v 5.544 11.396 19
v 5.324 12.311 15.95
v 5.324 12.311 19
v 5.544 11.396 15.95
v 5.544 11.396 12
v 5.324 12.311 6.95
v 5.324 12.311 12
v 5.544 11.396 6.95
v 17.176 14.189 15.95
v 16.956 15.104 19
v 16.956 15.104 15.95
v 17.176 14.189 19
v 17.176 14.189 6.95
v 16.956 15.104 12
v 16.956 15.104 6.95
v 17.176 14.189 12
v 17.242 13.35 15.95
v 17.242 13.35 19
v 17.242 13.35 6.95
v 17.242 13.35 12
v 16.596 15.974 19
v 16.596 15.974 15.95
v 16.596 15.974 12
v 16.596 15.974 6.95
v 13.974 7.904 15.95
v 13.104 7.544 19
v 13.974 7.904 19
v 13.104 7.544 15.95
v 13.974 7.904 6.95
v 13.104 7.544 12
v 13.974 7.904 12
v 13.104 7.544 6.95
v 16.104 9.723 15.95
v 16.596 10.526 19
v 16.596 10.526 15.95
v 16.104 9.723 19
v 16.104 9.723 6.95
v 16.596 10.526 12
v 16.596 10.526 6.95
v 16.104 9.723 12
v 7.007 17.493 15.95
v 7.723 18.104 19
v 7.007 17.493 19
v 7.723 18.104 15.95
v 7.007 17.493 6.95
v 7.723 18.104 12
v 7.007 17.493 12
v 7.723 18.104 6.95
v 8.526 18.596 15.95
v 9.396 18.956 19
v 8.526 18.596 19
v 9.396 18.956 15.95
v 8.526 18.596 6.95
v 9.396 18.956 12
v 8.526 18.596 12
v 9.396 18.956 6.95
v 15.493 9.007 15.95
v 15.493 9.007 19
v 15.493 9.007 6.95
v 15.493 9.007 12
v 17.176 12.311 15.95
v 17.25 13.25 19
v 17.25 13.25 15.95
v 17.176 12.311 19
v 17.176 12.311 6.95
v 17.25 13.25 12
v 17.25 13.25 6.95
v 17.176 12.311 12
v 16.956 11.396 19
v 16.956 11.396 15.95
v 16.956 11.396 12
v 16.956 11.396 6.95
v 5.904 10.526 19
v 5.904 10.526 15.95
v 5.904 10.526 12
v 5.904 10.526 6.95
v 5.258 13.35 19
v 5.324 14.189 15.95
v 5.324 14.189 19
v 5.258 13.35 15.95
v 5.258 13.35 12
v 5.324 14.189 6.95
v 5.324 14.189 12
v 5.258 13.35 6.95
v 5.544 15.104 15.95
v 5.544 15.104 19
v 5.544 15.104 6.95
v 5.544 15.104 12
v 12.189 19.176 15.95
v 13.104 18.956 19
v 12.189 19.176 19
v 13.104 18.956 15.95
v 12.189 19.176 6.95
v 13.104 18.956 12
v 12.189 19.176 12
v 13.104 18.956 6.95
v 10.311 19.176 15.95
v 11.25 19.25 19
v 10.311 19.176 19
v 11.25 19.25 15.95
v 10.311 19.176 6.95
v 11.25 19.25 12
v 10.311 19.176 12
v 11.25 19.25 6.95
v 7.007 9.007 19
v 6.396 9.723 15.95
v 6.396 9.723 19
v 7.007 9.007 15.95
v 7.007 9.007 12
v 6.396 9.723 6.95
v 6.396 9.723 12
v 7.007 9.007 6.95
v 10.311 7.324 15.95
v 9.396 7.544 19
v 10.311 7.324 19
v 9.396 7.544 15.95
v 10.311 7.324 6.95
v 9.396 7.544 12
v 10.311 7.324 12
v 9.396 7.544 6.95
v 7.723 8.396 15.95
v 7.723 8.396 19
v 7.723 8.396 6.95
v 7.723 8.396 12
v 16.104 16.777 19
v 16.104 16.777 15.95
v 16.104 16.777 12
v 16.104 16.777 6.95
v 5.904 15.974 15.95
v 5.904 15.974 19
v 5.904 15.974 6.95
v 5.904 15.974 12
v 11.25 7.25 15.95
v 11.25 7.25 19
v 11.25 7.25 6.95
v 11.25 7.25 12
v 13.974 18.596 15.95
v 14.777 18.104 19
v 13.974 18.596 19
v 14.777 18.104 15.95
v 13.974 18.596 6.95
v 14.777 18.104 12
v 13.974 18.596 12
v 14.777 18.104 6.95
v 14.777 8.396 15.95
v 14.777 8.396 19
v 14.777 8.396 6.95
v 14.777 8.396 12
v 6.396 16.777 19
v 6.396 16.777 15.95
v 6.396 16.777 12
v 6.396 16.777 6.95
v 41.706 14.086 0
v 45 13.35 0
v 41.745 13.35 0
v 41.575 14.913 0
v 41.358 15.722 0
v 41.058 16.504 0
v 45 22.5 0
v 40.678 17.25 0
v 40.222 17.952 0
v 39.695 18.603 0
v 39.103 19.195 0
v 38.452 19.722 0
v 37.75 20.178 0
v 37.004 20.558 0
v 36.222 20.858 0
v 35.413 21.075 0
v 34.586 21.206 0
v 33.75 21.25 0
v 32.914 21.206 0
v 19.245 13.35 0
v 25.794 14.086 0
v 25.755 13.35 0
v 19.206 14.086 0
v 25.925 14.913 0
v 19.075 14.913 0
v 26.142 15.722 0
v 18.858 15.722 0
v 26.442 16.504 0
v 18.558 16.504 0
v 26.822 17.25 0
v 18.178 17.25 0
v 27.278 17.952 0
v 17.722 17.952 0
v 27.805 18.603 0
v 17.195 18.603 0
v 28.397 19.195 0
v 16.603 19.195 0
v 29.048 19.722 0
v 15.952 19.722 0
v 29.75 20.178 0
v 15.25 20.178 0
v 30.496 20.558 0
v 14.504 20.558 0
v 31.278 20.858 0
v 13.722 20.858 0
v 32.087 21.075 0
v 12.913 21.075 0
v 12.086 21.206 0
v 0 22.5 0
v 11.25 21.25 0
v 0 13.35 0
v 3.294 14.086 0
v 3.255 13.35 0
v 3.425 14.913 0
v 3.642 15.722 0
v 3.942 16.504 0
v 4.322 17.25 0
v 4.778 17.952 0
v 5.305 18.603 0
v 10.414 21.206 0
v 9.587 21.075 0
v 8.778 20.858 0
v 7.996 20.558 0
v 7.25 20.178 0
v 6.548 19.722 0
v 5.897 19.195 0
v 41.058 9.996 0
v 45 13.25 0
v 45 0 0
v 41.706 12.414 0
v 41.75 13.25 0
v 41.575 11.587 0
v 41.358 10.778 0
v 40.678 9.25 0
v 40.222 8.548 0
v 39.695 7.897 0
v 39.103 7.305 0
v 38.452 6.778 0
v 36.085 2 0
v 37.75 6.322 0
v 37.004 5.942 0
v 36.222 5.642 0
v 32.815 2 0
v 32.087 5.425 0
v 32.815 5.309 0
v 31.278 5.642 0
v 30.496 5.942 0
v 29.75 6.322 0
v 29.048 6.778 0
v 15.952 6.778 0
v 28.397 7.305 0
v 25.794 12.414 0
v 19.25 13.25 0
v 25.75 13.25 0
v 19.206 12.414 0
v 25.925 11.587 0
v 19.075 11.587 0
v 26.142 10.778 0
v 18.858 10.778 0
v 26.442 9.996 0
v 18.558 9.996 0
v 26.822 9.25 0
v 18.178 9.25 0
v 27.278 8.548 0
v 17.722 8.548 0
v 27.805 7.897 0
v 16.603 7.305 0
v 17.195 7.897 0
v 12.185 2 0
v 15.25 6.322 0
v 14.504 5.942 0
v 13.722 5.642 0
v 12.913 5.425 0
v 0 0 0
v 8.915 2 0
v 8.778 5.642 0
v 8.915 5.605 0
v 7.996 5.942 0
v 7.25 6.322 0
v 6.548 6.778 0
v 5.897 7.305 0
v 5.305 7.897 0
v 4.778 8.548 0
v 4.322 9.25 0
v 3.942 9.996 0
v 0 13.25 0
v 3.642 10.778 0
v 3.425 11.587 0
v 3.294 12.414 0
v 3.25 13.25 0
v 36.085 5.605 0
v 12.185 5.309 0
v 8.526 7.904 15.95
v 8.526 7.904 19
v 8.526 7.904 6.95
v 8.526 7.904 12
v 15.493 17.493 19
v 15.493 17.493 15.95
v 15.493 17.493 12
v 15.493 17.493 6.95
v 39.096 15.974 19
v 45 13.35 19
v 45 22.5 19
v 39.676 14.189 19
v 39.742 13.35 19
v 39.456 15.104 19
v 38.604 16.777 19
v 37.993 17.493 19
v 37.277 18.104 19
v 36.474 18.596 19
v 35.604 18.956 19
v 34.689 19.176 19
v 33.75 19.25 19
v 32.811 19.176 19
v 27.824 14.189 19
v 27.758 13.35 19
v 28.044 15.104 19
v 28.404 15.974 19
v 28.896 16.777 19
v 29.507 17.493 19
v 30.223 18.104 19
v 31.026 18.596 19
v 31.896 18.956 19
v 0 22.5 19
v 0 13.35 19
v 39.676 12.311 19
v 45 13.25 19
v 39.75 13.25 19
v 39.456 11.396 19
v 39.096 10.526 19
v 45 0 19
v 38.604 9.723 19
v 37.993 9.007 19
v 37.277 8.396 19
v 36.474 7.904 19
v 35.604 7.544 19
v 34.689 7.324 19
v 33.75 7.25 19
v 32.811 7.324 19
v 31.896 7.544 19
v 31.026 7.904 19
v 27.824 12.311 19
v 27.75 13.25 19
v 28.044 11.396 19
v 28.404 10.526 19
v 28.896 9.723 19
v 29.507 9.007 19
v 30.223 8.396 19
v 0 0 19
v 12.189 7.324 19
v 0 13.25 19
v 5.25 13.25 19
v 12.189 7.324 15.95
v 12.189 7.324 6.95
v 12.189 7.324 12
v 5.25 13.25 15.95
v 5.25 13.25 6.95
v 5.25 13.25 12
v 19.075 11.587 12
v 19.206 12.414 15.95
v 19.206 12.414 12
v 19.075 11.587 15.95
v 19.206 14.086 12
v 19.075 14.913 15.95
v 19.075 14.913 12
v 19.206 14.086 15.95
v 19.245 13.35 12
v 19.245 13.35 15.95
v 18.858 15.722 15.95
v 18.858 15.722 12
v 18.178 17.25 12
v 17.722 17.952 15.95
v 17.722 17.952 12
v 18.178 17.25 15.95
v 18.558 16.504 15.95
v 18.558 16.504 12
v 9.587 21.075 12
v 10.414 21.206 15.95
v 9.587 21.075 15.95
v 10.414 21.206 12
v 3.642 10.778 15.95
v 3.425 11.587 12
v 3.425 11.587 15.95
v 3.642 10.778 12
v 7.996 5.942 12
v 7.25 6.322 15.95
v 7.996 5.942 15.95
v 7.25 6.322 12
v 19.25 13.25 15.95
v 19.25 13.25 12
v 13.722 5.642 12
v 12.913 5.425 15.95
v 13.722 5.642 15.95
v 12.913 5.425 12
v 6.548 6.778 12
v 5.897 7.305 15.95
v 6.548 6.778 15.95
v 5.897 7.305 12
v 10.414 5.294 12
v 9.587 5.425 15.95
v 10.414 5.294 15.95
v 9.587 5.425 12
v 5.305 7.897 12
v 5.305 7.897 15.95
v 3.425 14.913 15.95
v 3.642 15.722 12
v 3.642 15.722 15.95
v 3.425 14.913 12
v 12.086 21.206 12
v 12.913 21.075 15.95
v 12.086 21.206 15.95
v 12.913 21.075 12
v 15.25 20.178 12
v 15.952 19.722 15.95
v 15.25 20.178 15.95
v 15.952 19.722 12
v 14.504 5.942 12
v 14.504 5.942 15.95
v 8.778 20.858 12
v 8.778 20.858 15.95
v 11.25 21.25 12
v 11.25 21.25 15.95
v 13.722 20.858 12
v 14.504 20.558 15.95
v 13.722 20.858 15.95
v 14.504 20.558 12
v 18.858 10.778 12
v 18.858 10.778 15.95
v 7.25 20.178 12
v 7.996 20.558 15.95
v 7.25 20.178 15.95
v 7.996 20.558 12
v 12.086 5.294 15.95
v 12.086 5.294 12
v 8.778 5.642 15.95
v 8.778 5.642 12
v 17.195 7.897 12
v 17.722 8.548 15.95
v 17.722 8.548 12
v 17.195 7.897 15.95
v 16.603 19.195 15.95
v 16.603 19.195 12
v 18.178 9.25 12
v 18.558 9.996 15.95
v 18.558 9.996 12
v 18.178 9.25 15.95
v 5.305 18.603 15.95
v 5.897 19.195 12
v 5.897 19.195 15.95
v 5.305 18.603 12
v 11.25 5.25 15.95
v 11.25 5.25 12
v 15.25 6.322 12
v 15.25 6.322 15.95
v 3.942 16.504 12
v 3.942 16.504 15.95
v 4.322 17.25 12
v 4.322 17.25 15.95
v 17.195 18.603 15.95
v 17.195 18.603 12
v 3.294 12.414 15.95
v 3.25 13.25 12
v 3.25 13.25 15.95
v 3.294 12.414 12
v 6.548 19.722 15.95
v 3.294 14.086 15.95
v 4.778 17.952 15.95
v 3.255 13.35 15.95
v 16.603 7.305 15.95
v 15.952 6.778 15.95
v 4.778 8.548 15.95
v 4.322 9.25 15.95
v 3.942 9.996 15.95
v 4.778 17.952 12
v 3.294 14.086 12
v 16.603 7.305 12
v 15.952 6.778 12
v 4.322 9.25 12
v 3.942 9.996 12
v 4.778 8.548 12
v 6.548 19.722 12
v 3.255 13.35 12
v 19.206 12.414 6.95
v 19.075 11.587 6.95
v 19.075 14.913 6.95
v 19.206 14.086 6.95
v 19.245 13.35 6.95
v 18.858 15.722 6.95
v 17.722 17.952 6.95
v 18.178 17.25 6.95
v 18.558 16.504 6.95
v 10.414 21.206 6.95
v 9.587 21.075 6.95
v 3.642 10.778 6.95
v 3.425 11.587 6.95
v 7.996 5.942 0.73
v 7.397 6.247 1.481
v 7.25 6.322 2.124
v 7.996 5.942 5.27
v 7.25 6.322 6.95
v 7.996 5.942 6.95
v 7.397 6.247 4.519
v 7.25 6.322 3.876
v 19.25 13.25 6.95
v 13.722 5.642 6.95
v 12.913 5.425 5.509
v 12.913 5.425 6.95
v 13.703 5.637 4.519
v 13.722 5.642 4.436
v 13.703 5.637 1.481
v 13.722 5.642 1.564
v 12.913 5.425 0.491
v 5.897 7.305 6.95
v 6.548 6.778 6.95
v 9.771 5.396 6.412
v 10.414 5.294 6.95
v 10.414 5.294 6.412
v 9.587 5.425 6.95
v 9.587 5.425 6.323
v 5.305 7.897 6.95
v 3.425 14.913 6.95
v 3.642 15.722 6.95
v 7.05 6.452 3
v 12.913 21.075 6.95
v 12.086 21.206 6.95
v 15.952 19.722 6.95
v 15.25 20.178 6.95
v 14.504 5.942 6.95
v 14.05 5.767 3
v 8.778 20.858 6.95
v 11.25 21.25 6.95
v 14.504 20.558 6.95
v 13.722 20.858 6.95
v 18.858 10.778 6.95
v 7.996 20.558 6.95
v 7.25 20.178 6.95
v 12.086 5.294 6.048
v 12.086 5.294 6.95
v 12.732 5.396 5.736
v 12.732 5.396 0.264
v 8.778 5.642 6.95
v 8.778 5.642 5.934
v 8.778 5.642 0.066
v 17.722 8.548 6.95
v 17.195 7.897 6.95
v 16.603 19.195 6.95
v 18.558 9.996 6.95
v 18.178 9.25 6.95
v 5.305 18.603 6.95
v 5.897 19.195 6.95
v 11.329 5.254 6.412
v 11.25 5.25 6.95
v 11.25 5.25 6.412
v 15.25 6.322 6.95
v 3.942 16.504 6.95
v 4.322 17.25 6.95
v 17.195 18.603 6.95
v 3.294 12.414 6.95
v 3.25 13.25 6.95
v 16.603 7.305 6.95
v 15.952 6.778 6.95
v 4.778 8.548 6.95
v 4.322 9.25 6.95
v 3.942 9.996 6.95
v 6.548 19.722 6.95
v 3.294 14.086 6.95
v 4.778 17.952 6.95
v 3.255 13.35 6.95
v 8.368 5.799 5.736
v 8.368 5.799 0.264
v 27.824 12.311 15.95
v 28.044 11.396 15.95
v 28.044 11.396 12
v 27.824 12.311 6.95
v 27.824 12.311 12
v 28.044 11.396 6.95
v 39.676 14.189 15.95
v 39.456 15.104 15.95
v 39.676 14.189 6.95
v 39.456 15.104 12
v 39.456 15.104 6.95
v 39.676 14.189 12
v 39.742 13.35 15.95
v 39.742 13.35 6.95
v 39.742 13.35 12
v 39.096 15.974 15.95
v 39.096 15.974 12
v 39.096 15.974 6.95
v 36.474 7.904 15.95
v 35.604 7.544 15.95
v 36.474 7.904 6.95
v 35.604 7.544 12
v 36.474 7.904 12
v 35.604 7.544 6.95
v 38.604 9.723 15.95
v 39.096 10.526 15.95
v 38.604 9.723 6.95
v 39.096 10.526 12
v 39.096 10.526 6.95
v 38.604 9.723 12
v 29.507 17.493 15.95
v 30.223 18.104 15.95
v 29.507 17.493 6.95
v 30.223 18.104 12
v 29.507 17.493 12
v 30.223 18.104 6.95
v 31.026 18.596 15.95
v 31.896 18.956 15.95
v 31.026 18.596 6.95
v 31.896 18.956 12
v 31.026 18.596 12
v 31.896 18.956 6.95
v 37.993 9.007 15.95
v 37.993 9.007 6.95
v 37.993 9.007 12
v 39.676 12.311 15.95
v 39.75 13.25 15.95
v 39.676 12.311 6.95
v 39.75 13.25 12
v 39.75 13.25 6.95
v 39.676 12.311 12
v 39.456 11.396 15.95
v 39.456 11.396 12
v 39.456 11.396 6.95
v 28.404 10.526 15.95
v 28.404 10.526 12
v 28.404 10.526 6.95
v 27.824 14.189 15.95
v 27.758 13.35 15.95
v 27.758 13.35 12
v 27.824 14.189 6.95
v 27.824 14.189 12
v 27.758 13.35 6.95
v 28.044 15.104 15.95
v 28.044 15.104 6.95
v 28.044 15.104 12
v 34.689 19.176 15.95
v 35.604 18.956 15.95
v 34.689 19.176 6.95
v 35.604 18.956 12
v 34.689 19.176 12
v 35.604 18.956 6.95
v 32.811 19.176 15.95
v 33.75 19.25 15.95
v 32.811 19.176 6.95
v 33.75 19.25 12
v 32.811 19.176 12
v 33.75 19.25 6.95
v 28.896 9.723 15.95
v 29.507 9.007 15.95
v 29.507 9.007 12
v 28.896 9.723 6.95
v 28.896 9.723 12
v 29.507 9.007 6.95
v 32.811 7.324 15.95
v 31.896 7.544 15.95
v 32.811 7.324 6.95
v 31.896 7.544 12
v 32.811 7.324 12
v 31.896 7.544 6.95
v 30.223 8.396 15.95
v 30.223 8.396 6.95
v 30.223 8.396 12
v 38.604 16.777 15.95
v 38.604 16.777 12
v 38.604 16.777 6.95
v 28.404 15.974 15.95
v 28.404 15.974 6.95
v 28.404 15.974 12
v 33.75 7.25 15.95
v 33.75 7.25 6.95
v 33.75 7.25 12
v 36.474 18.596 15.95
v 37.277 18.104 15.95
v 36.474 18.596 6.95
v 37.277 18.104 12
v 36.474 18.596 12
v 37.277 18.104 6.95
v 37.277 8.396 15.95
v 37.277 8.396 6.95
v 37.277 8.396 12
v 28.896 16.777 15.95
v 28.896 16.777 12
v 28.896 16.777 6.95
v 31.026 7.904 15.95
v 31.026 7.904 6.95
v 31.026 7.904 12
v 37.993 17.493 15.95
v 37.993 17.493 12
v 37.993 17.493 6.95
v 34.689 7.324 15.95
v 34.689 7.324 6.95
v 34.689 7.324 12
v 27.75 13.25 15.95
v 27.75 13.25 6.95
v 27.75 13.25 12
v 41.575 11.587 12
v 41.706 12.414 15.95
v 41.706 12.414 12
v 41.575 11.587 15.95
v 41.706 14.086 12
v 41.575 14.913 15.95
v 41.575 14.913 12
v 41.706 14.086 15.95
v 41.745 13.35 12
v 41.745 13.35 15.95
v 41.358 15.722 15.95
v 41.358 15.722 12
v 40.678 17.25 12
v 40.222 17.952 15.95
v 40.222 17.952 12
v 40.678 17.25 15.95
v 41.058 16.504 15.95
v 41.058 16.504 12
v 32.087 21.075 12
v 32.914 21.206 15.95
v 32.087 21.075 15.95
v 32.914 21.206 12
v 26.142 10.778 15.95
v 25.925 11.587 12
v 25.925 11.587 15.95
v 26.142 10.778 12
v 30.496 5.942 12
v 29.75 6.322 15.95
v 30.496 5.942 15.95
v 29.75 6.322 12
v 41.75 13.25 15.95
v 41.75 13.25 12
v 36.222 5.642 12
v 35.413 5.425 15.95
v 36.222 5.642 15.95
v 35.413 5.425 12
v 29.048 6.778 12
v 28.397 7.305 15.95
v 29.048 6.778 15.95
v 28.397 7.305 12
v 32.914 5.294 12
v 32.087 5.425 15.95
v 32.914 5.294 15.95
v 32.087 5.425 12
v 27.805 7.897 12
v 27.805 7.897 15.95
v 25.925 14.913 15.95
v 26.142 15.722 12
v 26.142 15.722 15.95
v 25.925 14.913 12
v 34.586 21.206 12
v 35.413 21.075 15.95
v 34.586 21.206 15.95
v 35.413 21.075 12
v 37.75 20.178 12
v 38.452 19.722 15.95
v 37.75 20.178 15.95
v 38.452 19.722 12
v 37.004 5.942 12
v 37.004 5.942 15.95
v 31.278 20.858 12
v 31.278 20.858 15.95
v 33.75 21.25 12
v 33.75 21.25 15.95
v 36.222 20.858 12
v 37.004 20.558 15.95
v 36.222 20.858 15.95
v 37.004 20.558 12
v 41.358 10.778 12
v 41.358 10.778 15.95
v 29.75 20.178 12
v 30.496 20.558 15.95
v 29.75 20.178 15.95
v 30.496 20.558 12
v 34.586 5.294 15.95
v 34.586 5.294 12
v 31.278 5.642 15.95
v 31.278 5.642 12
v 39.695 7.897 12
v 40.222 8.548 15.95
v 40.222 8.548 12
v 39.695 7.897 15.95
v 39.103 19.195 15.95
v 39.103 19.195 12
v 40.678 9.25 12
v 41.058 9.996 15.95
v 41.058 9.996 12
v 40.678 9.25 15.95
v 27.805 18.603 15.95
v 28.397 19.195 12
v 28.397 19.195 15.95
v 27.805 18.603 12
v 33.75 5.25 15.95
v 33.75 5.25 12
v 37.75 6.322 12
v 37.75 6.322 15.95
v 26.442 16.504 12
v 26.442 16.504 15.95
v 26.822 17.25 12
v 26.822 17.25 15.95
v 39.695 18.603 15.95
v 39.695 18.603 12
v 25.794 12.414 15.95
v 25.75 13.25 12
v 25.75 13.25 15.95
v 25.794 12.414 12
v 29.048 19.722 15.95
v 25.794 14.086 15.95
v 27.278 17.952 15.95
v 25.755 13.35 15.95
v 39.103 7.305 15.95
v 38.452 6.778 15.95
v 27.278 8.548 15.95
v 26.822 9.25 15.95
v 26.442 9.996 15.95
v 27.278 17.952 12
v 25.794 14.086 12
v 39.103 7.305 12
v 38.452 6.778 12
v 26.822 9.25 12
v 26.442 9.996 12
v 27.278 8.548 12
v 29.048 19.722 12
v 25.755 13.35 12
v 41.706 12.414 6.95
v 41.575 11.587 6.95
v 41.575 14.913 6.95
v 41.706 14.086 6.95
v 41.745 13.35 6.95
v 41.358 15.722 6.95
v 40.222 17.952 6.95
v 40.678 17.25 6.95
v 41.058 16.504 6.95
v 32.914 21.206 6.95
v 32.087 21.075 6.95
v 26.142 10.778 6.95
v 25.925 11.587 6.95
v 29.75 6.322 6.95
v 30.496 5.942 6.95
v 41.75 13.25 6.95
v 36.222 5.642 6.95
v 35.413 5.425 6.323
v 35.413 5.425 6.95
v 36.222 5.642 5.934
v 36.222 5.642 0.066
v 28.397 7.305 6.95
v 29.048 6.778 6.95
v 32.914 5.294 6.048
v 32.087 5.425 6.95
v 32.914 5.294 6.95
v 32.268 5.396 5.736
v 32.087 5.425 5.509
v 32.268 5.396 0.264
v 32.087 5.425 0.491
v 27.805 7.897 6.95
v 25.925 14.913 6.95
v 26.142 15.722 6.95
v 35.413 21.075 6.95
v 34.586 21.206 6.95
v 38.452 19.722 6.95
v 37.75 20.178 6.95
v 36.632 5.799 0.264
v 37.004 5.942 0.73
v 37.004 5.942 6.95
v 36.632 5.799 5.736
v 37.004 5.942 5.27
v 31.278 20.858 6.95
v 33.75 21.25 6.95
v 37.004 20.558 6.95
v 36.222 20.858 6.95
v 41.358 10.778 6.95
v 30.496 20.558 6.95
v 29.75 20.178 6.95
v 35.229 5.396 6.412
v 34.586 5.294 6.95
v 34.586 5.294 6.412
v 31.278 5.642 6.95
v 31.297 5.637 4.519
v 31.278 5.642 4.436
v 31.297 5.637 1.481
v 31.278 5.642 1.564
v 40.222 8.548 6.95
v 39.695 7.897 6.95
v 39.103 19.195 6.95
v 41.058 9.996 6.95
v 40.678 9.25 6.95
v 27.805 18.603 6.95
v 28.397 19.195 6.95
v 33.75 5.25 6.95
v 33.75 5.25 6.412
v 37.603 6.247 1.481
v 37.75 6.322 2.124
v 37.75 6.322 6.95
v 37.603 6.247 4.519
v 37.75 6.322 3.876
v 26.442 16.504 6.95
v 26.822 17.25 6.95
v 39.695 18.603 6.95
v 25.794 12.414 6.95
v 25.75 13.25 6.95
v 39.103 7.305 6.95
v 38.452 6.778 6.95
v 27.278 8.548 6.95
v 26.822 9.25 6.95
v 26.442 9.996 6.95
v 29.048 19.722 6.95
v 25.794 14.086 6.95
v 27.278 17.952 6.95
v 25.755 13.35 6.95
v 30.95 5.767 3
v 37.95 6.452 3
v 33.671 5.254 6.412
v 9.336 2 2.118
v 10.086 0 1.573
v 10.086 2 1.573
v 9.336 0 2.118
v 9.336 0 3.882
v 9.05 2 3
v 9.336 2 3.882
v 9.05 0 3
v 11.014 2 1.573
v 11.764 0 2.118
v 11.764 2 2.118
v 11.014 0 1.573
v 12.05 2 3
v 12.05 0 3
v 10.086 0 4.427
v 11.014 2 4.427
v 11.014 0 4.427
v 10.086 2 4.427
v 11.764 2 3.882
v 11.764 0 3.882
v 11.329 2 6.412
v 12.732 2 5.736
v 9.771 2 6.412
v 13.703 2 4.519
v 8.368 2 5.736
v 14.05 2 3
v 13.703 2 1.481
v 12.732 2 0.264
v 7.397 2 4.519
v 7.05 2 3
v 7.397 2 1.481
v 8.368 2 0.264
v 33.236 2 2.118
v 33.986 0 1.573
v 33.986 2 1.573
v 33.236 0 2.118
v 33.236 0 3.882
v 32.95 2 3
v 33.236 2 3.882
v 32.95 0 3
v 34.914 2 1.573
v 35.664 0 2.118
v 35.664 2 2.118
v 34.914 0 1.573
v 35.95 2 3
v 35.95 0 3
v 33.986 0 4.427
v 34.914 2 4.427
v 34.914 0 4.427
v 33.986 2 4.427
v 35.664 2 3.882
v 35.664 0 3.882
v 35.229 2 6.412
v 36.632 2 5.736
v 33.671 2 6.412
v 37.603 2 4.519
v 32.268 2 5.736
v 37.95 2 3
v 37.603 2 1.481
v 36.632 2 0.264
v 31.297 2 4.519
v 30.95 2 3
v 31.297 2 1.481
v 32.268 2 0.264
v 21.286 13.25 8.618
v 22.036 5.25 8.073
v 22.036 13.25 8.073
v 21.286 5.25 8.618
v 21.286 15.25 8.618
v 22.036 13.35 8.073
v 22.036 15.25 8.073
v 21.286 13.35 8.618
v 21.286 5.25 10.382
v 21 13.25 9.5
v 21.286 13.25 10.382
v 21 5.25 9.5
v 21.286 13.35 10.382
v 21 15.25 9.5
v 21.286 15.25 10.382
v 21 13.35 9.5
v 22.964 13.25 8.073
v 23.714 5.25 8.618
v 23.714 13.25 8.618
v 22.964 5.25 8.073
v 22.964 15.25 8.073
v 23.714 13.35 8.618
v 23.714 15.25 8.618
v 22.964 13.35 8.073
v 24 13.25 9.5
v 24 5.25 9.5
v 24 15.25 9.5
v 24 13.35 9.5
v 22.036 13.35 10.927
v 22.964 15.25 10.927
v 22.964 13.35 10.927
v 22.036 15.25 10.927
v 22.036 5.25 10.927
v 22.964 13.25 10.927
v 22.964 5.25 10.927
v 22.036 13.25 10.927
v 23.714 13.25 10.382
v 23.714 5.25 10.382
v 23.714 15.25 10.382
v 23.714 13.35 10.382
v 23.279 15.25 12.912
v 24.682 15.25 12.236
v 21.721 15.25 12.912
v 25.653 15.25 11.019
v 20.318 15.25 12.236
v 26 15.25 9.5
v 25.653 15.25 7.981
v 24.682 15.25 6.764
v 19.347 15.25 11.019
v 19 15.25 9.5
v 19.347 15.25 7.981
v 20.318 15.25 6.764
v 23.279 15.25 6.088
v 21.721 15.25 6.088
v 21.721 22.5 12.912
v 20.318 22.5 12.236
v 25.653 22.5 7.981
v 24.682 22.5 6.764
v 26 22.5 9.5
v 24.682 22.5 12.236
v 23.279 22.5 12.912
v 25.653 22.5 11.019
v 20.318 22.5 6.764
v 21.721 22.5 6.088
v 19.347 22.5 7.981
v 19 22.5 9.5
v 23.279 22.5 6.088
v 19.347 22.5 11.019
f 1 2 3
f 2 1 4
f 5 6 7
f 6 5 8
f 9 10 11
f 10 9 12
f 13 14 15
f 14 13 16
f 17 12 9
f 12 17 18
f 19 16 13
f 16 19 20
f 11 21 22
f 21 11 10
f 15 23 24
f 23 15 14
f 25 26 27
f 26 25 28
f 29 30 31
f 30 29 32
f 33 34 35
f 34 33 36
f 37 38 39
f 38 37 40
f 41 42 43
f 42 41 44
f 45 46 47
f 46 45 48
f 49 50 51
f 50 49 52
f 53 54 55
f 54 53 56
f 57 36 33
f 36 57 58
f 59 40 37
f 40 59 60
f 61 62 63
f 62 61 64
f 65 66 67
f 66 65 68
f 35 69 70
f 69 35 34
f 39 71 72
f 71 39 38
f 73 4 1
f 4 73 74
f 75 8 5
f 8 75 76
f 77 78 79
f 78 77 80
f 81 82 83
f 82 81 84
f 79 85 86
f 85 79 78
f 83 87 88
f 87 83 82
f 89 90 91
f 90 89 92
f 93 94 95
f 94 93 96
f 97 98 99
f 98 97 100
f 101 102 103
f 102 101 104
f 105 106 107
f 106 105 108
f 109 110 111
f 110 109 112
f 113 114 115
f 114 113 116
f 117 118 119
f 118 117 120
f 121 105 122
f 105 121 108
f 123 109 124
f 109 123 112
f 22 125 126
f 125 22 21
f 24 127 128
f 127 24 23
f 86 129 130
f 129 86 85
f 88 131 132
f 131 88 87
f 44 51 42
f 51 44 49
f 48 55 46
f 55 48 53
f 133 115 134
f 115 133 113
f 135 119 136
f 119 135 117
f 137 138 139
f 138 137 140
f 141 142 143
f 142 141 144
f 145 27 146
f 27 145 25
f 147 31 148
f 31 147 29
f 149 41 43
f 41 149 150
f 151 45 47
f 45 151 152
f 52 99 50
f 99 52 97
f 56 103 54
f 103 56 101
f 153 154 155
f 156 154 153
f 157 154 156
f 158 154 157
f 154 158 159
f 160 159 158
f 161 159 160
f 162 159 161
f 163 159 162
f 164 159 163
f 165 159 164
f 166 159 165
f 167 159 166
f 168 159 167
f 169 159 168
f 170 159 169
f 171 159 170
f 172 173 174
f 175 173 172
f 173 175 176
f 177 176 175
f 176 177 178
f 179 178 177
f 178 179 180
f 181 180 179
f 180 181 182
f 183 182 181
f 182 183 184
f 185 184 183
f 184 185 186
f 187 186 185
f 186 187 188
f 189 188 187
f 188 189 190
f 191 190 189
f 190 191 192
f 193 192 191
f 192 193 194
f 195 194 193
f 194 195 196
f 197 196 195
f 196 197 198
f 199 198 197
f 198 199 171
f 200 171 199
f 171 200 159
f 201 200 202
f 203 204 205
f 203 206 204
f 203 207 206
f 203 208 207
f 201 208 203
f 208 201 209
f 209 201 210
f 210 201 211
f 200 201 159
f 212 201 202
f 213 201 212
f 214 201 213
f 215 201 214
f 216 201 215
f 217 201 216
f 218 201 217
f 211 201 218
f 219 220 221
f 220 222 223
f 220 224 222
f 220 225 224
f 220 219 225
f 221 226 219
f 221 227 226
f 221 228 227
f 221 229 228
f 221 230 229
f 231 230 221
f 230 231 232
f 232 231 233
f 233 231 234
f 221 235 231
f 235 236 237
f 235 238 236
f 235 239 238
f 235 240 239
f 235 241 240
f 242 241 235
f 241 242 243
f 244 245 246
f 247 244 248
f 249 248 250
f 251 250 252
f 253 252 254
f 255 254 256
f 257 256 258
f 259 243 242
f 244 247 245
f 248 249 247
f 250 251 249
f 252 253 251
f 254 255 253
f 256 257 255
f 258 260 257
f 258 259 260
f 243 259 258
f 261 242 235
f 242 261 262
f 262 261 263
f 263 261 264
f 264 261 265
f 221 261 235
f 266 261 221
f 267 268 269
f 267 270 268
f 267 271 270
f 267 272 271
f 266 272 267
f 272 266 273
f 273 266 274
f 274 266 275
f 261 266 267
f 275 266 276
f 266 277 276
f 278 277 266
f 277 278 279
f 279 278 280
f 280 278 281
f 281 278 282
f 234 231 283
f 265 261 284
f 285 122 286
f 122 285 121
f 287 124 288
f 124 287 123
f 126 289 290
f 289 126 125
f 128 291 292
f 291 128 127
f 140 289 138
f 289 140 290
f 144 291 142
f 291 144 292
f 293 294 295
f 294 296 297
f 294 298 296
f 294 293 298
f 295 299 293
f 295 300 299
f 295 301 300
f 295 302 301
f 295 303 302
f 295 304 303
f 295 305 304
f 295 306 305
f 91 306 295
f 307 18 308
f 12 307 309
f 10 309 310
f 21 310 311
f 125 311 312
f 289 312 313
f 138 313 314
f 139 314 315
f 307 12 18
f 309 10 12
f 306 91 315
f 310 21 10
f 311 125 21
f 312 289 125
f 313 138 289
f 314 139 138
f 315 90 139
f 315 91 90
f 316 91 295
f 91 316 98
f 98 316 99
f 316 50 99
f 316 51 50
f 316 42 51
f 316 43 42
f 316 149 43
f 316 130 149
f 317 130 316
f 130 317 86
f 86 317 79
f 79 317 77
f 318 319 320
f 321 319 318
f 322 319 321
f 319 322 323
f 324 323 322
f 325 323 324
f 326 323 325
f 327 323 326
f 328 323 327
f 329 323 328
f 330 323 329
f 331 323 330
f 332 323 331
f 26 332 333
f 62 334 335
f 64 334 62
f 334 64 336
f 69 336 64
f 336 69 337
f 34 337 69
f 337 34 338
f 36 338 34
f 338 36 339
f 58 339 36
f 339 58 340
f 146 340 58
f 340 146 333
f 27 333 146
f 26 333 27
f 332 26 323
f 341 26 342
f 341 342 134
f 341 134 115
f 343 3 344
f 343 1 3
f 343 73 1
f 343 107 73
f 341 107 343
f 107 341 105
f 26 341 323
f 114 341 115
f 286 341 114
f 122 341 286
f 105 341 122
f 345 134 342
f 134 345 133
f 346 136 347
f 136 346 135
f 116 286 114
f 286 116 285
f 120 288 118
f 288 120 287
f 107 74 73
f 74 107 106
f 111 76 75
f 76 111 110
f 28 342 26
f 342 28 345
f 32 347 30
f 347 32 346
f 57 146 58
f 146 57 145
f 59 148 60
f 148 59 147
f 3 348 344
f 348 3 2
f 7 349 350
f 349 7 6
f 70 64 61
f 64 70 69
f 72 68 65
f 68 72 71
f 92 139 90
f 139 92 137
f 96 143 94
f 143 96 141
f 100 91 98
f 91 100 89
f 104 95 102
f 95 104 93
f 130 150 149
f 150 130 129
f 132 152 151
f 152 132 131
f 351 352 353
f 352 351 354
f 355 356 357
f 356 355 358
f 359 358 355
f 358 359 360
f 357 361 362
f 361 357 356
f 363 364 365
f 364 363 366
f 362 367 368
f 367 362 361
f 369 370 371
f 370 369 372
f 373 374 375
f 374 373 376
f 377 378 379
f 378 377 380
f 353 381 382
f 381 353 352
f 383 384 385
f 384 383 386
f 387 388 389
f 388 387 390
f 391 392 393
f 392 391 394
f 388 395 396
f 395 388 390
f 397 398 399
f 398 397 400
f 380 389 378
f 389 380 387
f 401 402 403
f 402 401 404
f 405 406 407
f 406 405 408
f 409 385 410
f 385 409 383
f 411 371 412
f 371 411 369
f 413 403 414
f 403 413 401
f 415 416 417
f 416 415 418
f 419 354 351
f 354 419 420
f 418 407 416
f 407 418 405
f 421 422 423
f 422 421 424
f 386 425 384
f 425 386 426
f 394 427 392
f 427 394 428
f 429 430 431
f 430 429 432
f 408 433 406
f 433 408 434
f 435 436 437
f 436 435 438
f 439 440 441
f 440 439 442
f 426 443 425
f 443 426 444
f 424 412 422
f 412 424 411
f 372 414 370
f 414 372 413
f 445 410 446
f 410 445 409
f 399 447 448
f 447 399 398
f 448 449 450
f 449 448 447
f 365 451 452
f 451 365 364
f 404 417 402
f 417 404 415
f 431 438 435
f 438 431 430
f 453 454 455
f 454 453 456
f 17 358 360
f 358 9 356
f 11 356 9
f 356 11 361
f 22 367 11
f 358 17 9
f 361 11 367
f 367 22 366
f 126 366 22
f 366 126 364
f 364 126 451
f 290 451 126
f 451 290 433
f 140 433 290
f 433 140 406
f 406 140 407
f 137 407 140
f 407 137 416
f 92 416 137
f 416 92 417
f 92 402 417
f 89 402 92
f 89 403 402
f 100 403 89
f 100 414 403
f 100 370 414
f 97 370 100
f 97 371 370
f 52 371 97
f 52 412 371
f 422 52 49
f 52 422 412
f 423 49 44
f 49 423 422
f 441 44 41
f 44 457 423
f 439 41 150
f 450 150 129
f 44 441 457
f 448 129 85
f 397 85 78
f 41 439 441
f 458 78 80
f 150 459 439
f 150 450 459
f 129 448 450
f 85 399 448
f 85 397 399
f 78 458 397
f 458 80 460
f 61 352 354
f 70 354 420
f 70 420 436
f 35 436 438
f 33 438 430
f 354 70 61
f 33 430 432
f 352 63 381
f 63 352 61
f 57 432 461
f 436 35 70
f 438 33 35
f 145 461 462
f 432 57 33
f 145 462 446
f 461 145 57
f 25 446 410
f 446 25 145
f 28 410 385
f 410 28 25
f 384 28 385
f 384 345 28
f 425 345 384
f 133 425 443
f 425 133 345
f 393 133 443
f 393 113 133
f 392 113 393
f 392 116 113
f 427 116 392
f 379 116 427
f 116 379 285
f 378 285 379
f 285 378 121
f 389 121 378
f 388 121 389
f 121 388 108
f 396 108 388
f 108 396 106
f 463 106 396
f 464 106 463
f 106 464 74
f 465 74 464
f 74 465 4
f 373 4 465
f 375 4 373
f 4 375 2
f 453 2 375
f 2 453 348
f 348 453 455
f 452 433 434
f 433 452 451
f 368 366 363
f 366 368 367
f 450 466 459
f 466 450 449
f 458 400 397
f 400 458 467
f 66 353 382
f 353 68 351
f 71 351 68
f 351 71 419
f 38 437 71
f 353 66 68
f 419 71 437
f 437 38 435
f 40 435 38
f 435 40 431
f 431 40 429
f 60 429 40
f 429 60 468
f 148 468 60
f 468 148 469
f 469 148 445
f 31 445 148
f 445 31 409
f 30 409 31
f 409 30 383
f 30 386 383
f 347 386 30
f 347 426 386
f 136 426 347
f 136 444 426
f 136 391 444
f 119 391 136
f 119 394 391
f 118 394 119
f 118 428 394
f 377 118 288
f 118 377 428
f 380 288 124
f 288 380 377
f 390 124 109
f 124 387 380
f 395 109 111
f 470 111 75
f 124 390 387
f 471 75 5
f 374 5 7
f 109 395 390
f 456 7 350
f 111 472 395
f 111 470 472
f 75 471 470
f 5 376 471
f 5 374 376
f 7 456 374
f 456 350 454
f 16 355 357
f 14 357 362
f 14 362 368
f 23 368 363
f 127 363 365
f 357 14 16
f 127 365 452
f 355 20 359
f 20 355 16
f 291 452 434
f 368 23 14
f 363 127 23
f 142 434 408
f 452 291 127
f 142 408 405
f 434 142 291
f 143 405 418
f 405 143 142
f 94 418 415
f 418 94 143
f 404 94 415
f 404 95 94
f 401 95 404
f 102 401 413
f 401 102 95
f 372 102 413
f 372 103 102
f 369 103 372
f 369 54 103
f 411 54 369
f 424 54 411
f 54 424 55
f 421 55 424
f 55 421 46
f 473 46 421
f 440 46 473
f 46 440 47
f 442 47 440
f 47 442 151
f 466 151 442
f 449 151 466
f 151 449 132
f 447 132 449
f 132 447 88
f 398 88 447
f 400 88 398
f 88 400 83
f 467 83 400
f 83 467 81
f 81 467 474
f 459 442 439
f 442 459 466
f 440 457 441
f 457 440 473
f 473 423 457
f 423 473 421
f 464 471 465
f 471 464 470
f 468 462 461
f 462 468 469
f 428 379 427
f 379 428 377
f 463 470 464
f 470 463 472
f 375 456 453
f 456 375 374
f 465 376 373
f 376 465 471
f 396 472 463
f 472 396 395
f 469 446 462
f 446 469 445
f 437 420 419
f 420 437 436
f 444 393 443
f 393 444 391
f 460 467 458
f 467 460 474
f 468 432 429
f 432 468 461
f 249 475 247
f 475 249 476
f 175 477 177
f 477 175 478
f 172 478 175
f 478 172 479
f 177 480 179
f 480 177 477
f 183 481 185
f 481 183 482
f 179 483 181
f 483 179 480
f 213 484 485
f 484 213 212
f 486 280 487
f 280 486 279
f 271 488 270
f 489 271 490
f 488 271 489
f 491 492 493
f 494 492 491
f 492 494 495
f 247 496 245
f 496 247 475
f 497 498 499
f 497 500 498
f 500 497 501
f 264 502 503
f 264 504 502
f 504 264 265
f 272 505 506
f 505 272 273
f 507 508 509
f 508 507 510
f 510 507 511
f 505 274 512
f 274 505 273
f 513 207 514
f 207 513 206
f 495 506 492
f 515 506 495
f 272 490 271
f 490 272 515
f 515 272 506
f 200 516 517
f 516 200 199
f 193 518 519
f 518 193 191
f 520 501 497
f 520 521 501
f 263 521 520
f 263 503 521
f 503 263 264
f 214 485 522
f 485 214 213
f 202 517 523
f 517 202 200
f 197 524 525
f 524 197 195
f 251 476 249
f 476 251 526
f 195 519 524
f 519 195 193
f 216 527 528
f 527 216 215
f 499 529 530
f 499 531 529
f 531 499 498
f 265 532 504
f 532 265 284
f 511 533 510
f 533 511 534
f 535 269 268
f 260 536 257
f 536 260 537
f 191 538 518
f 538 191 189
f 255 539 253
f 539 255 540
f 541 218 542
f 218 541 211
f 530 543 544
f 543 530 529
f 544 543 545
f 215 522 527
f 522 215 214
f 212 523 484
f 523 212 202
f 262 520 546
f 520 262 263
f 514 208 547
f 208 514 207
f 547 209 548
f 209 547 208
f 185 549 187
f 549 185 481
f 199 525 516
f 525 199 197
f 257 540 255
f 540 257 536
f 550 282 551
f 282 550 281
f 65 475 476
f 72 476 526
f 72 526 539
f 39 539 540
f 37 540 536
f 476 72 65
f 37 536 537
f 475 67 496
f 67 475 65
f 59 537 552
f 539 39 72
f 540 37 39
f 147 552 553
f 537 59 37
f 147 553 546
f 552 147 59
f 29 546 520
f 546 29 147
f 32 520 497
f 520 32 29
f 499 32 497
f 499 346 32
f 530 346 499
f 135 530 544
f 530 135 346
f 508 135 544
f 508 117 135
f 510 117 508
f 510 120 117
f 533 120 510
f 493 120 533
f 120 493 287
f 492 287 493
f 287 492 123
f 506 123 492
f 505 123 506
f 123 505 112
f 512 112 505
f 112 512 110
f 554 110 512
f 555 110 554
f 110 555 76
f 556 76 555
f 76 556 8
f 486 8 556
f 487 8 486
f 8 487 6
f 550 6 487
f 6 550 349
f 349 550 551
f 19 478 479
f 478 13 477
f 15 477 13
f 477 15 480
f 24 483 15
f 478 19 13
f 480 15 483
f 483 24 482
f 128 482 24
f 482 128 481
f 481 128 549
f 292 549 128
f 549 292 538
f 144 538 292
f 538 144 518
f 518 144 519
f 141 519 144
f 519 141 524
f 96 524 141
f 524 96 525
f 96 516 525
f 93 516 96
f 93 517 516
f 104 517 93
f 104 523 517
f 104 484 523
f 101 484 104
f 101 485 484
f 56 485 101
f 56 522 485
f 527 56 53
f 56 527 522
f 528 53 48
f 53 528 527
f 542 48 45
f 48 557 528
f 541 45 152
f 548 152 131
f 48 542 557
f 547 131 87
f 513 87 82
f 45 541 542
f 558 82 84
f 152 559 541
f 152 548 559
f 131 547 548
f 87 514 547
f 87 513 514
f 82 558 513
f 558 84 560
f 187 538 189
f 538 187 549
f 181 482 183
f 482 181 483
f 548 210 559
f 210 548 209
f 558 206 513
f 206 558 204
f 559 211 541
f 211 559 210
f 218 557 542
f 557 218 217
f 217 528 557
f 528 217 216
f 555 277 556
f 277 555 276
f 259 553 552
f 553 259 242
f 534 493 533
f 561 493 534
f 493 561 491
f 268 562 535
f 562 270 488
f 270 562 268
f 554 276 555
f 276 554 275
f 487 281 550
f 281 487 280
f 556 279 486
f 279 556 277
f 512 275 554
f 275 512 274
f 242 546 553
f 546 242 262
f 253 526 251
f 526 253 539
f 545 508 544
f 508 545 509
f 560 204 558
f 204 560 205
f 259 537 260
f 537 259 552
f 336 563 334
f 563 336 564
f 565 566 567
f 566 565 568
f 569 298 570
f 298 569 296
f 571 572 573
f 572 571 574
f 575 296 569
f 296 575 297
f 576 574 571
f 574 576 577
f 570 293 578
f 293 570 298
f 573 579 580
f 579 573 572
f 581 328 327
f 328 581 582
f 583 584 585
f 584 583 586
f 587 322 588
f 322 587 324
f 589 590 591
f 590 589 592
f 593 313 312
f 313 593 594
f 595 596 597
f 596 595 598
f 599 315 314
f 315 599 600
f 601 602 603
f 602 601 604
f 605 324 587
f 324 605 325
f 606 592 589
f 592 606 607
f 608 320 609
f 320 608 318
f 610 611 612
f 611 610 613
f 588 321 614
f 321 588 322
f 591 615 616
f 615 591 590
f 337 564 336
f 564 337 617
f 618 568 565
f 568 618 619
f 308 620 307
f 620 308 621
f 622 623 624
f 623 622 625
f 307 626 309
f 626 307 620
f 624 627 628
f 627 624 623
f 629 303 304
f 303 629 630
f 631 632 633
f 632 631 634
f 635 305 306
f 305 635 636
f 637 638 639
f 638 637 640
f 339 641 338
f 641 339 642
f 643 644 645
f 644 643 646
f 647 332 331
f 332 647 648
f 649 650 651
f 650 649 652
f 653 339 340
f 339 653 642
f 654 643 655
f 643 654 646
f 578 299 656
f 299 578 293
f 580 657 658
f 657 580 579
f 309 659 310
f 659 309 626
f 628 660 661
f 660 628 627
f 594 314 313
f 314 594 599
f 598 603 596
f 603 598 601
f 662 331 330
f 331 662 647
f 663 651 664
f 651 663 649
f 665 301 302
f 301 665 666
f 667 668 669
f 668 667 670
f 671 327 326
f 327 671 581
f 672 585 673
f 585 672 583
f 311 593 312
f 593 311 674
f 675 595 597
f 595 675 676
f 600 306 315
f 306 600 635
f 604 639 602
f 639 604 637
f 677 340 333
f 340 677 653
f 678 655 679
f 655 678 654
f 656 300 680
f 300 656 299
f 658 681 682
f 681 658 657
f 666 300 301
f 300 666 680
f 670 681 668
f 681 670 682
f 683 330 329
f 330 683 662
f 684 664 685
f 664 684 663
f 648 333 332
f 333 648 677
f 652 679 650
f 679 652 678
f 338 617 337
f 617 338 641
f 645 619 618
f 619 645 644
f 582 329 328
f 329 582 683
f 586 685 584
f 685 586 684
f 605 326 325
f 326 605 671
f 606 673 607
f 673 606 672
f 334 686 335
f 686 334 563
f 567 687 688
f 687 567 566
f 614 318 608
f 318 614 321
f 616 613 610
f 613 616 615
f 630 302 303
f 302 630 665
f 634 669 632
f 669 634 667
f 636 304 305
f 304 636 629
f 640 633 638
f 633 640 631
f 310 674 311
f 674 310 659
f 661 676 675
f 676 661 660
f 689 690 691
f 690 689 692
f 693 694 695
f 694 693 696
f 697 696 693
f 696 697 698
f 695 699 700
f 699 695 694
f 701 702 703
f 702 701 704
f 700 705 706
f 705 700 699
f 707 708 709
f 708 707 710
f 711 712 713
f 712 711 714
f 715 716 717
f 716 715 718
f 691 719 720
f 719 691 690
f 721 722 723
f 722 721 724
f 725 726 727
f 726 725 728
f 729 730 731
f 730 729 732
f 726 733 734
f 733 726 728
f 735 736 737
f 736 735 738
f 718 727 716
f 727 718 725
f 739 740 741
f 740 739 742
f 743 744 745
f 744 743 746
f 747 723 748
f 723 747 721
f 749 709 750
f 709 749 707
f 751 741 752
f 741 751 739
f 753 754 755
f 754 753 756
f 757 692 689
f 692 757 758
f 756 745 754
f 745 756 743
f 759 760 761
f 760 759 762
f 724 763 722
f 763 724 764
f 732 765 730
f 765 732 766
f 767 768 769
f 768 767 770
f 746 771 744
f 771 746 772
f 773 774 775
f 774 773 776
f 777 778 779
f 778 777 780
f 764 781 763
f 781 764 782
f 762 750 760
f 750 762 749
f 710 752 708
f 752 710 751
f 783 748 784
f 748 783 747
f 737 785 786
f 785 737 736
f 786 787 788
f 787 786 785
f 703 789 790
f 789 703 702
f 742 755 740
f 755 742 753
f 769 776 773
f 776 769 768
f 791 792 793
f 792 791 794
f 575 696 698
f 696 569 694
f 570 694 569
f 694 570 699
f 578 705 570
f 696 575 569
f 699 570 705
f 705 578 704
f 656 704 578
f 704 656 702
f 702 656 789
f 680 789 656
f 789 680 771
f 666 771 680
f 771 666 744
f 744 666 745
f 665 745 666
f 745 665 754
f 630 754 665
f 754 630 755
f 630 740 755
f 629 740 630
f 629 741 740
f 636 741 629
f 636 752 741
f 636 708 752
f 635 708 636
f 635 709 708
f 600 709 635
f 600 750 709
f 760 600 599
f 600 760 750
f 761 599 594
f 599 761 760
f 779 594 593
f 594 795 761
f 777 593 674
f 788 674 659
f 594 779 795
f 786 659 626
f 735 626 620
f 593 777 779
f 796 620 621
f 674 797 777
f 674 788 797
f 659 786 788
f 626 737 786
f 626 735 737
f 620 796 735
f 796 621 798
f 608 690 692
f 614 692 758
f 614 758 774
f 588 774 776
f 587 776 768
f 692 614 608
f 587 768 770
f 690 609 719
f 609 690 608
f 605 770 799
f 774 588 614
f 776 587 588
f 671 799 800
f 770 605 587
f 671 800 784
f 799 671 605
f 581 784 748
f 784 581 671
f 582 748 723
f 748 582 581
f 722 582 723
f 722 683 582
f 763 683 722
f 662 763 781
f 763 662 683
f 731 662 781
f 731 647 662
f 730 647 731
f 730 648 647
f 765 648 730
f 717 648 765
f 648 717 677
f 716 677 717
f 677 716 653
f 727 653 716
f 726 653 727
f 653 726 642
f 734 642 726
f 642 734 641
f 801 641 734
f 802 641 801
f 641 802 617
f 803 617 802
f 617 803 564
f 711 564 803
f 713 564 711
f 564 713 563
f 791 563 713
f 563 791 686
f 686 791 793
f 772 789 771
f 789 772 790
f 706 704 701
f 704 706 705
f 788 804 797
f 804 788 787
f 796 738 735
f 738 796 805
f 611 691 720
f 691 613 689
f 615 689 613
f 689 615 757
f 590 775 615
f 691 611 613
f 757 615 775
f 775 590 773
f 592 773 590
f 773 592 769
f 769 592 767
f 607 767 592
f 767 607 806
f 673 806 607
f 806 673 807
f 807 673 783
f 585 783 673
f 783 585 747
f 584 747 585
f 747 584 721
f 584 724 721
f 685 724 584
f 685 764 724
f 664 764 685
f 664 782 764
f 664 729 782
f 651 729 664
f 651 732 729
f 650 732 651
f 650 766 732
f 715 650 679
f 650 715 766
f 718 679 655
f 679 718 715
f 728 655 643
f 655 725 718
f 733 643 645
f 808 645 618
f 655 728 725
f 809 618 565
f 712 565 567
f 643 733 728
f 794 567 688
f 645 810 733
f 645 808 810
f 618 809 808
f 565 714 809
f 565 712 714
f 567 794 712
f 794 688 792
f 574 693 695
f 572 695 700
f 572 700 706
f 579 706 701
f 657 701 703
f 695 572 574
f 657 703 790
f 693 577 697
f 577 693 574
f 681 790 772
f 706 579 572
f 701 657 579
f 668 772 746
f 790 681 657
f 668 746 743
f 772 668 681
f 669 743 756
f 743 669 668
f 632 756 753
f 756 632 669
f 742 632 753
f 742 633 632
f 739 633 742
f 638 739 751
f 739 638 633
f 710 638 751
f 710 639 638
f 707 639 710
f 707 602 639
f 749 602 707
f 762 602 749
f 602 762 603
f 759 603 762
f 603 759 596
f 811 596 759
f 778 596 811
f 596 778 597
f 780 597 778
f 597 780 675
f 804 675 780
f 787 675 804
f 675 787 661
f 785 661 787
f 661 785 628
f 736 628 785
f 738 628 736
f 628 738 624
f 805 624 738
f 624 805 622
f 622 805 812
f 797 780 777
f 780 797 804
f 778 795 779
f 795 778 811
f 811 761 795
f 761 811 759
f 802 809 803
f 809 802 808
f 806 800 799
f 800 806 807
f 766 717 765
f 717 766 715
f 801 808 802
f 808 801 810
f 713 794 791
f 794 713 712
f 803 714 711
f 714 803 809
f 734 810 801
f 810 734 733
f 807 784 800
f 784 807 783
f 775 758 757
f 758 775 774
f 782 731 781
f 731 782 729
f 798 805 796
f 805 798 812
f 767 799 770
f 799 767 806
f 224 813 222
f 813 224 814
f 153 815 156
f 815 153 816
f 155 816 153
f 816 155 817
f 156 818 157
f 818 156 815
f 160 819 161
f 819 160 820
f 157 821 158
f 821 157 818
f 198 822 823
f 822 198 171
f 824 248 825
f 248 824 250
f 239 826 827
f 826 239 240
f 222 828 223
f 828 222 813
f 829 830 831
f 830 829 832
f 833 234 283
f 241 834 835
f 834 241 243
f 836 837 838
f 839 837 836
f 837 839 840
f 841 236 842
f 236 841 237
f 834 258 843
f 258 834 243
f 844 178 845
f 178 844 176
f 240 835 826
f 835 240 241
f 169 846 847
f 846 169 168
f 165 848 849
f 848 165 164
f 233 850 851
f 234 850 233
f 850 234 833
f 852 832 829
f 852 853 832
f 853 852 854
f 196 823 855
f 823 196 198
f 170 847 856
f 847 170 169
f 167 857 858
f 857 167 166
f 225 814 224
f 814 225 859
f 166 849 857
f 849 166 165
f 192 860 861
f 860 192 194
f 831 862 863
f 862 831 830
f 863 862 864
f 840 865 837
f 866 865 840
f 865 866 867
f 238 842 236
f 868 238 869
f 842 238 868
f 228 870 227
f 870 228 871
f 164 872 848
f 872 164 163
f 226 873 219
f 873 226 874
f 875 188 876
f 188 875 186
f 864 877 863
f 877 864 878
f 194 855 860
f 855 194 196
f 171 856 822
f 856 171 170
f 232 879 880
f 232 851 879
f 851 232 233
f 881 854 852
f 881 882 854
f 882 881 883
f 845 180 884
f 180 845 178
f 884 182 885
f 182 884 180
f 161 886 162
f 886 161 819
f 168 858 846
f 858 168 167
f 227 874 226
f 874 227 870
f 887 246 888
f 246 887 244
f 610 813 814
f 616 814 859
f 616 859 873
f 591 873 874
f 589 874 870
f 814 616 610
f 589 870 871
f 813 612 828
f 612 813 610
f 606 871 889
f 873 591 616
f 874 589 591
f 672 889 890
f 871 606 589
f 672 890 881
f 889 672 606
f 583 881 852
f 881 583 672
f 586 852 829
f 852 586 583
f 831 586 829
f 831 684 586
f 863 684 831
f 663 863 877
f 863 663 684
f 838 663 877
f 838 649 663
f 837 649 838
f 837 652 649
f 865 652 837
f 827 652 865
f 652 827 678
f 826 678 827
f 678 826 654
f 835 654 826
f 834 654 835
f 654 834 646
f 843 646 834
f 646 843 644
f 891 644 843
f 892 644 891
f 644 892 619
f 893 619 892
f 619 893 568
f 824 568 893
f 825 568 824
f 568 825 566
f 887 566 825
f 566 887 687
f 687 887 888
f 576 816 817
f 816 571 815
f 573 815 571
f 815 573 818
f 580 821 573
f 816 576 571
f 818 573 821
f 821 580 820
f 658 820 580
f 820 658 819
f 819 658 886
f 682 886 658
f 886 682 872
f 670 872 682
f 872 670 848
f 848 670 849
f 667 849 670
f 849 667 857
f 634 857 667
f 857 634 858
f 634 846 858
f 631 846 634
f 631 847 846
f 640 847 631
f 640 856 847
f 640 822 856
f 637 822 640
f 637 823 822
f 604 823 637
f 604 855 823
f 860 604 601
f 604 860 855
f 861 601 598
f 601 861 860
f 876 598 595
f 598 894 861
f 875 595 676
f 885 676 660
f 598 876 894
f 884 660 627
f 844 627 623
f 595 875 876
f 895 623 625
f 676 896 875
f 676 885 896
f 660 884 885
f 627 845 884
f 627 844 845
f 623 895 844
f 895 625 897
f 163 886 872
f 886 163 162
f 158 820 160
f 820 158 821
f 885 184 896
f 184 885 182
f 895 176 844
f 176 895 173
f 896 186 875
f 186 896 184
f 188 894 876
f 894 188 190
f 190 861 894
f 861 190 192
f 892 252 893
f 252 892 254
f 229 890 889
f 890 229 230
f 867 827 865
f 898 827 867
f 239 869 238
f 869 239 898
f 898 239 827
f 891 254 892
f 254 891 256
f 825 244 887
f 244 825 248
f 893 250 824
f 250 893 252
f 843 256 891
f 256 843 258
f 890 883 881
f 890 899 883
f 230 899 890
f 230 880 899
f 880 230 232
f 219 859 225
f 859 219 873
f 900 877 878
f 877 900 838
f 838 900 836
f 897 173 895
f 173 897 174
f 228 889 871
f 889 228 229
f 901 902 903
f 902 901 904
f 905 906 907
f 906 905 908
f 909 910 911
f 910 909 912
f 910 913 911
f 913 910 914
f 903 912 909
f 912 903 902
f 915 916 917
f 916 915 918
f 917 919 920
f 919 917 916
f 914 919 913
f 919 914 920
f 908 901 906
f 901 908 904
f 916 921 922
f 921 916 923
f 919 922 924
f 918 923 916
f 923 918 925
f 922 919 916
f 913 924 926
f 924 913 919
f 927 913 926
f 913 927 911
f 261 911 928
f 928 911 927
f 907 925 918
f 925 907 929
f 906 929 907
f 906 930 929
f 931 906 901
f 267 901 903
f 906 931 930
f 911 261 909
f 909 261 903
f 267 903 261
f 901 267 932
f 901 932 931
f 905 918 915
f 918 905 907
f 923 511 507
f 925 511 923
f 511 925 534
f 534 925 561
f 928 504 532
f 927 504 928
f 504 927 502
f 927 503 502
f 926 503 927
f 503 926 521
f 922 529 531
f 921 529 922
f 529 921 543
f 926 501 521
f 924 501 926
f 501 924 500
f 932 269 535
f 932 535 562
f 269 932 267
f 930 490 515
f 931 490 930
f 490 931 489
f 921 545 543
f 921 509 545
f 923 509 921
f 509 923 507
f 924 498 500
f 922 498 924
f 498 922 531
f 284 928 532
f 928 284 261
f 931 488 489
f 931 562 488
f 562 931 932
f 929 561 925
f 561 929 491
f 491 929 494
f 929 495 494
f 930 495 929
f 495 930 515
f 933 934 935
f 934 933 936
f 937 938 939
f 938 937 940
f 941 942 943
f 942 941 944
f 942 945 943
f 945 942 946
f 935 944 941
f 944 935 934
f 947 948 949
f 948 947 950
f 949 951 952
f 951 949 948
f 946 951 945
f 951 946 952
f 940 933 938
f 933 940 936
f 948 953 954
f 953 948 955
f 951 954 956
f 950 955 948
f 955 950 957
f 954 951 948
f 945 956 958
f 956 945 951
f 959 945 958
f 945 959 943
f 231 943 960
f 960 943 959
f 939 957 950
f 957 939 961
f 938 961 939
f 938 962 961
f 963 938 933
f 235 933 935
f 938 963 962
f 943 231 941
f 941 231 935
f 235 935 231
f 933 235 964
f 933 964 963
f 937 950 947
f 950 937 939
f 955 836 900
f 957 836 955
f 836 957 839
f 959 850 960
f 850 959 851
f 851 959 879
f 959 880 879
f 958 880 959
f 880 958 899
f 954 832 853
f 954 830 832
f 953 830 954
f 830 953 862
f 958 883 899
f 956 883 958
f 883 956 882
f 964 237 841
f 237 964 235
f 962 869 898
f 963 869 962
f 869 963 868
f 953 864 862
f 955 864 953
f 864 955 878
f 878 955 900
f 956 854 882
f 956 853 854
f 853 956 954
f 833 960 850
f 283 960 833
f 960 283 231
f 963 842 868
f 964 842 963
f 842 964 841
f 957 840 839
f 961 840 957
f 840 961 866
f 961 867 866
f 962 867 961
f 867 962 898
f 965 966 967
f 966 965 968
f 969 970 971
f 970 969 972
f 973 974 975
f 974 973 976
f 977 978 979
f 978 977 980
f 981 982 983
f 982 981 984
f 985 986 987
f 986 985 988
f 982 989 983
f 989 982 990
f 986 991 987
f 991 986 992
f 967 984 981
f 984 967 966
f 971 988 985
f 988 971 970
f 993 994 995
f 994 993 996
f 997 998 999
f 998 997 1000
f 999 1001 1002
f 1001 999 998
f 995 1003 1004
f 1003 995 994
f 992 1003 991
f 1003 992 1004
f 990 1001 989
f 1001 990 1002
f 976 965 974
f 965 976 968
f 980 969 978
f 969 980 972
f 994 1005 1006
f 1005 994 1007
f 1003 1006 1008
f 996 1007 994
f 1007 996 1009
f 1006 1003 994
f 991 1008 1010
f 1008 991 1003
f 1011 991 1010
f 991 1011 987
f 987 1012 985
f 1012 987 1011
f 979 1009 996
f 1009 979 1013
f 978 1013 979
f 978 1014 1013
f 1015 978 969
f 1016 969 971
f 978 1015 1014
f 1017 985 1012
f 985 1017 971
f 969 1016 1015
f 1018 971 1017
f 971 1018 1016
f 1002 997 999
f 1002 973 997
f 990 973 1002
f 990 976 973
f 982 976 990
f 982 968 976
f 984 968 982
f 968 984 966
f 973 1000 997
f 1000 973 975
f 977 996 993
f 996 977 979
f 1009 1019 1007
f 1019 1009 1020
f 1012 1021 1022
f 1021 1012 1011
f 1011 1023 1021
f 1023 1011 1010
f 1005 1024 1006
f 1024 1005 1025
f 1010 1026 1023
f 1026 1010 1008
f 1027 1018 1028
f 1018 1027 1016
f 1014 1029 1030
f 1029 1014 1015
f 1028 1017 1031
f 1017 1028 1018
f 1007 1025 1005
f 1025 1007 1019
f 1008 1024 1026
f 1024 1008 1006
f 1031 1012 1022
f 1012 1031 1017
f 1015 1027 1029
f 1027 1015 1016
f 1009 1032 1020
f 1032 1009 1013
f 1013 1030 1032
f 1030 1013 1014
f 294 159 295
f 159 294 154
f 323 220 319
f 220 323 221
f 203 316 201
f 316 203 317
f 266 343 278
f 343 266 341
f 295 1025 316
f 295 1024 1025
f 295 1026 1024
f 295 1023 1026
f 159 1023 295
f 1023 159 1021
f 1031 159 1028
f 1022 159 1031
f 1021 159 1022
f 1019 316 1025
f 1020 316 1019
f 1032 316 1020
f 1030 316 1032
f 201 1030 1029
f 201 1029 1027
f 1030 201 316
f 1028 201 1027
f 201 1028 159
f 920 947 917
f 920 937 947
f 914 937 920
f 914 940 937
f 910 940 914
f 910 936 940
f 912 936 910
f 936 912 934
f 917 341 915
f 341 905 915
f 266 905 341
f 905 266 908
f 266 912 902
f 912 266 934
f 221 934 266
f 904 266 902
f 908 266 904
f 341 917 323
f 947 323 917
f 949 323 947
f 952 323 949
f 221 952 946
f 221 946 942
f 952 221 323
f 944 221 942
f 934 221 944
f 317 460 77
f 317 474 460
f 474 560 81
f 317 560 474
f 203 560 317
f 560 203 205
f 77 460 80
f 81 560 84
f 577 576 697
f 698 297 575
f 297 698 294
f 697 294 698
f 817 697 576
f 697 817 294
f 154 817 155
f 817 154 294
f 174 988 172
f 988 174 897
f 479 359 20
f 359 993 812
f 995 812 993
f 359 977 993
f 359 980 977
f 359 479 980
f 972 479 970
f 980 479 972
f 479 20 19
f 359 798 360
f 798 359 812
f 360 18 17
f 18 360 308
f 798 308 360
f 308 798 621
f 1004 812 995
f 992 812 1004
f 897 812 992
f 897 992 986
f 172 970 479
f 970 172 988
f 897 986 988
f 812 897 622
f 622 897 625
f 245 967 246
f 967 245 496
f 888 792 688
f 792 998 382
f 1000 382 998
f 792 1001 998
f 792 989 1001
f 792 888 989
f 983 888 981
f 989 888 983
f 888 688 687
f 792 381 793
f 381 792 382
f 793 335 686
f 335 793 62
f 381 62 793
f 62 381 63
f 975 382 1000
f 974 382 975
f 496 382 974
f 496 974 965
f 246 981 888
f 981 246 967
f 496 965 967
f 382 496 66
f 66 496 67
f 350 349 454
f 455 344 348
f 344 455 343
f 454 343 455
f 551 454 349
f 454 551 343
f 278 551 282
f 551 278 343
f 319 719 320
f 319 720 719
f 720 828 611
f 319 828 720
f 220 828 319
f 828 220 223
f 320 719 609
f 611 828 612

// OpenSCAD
/*
Heads to be 22.5mm apart, this is the heatsink width
Mount holes 23.9mm apart, embedded under heads
mount uses 3mm screws with 6mm head hole


bottom of j head is 50mm above print head height
bottom of J head must be at level with mount holes
16mm oututer 12mm inner
6mm gap 3.6mm top ring

*/

JOD     =   16;         //J head outer diameter
JID     =   12;         //J head inner diameter
JUR     =   3.95;       //J head upper ring height
JCR     =   6;          //J head center ring height
JSW     =   22.5;       //J head spacing width

MX      =   JSW * 2;    //Total X length for mount
MZ      =   19;         //Total height

module j_head(){
    union(){ //center hole
    translate ([0,0,0]) cylinder(MZ, JID/2, JID/2, center = false, $fn=40);
    translate ([0,0,12]) cylinder(JUR, JOD/2, JOD/2, center = false, $fn=60);
    translate ([0,0,0]) cylinder(JUR + 3, JOD/2, JOD/2, center = false, $fn=60);
    }
}

module screw_hole(){
    rotate([270,0,0]){
        translate([0,0,-8]) cylinder(10,1.5,1.5, $fn = 10);
        translate([0,0,2]) cylinder(18,3.5,3.5, $fn = 14);
    }
}

module j_head_mount(){
    
    difference(){
        cube([MX, JSW, MZ]);
        translate([JSW/2,JSW/2 + 2,0]) j_head();
        translate([JSW/2 + JSW,JSW/2 + 2,0]) j_head();
        translate([(MX - 23.9) / 2,0,3]) screw_hole();
        translate([(MX - 23.9) / 2 + 23.9,0,3]) screw_hole();
        translate([MX/2,JSW/2 + 2,MZ/2]) screw_hole();
    }
}
difference(){
   j_head_mount();
   translate([0,JSW/2 + 2,0]) cube([MX,0.1,MZ]);
}
